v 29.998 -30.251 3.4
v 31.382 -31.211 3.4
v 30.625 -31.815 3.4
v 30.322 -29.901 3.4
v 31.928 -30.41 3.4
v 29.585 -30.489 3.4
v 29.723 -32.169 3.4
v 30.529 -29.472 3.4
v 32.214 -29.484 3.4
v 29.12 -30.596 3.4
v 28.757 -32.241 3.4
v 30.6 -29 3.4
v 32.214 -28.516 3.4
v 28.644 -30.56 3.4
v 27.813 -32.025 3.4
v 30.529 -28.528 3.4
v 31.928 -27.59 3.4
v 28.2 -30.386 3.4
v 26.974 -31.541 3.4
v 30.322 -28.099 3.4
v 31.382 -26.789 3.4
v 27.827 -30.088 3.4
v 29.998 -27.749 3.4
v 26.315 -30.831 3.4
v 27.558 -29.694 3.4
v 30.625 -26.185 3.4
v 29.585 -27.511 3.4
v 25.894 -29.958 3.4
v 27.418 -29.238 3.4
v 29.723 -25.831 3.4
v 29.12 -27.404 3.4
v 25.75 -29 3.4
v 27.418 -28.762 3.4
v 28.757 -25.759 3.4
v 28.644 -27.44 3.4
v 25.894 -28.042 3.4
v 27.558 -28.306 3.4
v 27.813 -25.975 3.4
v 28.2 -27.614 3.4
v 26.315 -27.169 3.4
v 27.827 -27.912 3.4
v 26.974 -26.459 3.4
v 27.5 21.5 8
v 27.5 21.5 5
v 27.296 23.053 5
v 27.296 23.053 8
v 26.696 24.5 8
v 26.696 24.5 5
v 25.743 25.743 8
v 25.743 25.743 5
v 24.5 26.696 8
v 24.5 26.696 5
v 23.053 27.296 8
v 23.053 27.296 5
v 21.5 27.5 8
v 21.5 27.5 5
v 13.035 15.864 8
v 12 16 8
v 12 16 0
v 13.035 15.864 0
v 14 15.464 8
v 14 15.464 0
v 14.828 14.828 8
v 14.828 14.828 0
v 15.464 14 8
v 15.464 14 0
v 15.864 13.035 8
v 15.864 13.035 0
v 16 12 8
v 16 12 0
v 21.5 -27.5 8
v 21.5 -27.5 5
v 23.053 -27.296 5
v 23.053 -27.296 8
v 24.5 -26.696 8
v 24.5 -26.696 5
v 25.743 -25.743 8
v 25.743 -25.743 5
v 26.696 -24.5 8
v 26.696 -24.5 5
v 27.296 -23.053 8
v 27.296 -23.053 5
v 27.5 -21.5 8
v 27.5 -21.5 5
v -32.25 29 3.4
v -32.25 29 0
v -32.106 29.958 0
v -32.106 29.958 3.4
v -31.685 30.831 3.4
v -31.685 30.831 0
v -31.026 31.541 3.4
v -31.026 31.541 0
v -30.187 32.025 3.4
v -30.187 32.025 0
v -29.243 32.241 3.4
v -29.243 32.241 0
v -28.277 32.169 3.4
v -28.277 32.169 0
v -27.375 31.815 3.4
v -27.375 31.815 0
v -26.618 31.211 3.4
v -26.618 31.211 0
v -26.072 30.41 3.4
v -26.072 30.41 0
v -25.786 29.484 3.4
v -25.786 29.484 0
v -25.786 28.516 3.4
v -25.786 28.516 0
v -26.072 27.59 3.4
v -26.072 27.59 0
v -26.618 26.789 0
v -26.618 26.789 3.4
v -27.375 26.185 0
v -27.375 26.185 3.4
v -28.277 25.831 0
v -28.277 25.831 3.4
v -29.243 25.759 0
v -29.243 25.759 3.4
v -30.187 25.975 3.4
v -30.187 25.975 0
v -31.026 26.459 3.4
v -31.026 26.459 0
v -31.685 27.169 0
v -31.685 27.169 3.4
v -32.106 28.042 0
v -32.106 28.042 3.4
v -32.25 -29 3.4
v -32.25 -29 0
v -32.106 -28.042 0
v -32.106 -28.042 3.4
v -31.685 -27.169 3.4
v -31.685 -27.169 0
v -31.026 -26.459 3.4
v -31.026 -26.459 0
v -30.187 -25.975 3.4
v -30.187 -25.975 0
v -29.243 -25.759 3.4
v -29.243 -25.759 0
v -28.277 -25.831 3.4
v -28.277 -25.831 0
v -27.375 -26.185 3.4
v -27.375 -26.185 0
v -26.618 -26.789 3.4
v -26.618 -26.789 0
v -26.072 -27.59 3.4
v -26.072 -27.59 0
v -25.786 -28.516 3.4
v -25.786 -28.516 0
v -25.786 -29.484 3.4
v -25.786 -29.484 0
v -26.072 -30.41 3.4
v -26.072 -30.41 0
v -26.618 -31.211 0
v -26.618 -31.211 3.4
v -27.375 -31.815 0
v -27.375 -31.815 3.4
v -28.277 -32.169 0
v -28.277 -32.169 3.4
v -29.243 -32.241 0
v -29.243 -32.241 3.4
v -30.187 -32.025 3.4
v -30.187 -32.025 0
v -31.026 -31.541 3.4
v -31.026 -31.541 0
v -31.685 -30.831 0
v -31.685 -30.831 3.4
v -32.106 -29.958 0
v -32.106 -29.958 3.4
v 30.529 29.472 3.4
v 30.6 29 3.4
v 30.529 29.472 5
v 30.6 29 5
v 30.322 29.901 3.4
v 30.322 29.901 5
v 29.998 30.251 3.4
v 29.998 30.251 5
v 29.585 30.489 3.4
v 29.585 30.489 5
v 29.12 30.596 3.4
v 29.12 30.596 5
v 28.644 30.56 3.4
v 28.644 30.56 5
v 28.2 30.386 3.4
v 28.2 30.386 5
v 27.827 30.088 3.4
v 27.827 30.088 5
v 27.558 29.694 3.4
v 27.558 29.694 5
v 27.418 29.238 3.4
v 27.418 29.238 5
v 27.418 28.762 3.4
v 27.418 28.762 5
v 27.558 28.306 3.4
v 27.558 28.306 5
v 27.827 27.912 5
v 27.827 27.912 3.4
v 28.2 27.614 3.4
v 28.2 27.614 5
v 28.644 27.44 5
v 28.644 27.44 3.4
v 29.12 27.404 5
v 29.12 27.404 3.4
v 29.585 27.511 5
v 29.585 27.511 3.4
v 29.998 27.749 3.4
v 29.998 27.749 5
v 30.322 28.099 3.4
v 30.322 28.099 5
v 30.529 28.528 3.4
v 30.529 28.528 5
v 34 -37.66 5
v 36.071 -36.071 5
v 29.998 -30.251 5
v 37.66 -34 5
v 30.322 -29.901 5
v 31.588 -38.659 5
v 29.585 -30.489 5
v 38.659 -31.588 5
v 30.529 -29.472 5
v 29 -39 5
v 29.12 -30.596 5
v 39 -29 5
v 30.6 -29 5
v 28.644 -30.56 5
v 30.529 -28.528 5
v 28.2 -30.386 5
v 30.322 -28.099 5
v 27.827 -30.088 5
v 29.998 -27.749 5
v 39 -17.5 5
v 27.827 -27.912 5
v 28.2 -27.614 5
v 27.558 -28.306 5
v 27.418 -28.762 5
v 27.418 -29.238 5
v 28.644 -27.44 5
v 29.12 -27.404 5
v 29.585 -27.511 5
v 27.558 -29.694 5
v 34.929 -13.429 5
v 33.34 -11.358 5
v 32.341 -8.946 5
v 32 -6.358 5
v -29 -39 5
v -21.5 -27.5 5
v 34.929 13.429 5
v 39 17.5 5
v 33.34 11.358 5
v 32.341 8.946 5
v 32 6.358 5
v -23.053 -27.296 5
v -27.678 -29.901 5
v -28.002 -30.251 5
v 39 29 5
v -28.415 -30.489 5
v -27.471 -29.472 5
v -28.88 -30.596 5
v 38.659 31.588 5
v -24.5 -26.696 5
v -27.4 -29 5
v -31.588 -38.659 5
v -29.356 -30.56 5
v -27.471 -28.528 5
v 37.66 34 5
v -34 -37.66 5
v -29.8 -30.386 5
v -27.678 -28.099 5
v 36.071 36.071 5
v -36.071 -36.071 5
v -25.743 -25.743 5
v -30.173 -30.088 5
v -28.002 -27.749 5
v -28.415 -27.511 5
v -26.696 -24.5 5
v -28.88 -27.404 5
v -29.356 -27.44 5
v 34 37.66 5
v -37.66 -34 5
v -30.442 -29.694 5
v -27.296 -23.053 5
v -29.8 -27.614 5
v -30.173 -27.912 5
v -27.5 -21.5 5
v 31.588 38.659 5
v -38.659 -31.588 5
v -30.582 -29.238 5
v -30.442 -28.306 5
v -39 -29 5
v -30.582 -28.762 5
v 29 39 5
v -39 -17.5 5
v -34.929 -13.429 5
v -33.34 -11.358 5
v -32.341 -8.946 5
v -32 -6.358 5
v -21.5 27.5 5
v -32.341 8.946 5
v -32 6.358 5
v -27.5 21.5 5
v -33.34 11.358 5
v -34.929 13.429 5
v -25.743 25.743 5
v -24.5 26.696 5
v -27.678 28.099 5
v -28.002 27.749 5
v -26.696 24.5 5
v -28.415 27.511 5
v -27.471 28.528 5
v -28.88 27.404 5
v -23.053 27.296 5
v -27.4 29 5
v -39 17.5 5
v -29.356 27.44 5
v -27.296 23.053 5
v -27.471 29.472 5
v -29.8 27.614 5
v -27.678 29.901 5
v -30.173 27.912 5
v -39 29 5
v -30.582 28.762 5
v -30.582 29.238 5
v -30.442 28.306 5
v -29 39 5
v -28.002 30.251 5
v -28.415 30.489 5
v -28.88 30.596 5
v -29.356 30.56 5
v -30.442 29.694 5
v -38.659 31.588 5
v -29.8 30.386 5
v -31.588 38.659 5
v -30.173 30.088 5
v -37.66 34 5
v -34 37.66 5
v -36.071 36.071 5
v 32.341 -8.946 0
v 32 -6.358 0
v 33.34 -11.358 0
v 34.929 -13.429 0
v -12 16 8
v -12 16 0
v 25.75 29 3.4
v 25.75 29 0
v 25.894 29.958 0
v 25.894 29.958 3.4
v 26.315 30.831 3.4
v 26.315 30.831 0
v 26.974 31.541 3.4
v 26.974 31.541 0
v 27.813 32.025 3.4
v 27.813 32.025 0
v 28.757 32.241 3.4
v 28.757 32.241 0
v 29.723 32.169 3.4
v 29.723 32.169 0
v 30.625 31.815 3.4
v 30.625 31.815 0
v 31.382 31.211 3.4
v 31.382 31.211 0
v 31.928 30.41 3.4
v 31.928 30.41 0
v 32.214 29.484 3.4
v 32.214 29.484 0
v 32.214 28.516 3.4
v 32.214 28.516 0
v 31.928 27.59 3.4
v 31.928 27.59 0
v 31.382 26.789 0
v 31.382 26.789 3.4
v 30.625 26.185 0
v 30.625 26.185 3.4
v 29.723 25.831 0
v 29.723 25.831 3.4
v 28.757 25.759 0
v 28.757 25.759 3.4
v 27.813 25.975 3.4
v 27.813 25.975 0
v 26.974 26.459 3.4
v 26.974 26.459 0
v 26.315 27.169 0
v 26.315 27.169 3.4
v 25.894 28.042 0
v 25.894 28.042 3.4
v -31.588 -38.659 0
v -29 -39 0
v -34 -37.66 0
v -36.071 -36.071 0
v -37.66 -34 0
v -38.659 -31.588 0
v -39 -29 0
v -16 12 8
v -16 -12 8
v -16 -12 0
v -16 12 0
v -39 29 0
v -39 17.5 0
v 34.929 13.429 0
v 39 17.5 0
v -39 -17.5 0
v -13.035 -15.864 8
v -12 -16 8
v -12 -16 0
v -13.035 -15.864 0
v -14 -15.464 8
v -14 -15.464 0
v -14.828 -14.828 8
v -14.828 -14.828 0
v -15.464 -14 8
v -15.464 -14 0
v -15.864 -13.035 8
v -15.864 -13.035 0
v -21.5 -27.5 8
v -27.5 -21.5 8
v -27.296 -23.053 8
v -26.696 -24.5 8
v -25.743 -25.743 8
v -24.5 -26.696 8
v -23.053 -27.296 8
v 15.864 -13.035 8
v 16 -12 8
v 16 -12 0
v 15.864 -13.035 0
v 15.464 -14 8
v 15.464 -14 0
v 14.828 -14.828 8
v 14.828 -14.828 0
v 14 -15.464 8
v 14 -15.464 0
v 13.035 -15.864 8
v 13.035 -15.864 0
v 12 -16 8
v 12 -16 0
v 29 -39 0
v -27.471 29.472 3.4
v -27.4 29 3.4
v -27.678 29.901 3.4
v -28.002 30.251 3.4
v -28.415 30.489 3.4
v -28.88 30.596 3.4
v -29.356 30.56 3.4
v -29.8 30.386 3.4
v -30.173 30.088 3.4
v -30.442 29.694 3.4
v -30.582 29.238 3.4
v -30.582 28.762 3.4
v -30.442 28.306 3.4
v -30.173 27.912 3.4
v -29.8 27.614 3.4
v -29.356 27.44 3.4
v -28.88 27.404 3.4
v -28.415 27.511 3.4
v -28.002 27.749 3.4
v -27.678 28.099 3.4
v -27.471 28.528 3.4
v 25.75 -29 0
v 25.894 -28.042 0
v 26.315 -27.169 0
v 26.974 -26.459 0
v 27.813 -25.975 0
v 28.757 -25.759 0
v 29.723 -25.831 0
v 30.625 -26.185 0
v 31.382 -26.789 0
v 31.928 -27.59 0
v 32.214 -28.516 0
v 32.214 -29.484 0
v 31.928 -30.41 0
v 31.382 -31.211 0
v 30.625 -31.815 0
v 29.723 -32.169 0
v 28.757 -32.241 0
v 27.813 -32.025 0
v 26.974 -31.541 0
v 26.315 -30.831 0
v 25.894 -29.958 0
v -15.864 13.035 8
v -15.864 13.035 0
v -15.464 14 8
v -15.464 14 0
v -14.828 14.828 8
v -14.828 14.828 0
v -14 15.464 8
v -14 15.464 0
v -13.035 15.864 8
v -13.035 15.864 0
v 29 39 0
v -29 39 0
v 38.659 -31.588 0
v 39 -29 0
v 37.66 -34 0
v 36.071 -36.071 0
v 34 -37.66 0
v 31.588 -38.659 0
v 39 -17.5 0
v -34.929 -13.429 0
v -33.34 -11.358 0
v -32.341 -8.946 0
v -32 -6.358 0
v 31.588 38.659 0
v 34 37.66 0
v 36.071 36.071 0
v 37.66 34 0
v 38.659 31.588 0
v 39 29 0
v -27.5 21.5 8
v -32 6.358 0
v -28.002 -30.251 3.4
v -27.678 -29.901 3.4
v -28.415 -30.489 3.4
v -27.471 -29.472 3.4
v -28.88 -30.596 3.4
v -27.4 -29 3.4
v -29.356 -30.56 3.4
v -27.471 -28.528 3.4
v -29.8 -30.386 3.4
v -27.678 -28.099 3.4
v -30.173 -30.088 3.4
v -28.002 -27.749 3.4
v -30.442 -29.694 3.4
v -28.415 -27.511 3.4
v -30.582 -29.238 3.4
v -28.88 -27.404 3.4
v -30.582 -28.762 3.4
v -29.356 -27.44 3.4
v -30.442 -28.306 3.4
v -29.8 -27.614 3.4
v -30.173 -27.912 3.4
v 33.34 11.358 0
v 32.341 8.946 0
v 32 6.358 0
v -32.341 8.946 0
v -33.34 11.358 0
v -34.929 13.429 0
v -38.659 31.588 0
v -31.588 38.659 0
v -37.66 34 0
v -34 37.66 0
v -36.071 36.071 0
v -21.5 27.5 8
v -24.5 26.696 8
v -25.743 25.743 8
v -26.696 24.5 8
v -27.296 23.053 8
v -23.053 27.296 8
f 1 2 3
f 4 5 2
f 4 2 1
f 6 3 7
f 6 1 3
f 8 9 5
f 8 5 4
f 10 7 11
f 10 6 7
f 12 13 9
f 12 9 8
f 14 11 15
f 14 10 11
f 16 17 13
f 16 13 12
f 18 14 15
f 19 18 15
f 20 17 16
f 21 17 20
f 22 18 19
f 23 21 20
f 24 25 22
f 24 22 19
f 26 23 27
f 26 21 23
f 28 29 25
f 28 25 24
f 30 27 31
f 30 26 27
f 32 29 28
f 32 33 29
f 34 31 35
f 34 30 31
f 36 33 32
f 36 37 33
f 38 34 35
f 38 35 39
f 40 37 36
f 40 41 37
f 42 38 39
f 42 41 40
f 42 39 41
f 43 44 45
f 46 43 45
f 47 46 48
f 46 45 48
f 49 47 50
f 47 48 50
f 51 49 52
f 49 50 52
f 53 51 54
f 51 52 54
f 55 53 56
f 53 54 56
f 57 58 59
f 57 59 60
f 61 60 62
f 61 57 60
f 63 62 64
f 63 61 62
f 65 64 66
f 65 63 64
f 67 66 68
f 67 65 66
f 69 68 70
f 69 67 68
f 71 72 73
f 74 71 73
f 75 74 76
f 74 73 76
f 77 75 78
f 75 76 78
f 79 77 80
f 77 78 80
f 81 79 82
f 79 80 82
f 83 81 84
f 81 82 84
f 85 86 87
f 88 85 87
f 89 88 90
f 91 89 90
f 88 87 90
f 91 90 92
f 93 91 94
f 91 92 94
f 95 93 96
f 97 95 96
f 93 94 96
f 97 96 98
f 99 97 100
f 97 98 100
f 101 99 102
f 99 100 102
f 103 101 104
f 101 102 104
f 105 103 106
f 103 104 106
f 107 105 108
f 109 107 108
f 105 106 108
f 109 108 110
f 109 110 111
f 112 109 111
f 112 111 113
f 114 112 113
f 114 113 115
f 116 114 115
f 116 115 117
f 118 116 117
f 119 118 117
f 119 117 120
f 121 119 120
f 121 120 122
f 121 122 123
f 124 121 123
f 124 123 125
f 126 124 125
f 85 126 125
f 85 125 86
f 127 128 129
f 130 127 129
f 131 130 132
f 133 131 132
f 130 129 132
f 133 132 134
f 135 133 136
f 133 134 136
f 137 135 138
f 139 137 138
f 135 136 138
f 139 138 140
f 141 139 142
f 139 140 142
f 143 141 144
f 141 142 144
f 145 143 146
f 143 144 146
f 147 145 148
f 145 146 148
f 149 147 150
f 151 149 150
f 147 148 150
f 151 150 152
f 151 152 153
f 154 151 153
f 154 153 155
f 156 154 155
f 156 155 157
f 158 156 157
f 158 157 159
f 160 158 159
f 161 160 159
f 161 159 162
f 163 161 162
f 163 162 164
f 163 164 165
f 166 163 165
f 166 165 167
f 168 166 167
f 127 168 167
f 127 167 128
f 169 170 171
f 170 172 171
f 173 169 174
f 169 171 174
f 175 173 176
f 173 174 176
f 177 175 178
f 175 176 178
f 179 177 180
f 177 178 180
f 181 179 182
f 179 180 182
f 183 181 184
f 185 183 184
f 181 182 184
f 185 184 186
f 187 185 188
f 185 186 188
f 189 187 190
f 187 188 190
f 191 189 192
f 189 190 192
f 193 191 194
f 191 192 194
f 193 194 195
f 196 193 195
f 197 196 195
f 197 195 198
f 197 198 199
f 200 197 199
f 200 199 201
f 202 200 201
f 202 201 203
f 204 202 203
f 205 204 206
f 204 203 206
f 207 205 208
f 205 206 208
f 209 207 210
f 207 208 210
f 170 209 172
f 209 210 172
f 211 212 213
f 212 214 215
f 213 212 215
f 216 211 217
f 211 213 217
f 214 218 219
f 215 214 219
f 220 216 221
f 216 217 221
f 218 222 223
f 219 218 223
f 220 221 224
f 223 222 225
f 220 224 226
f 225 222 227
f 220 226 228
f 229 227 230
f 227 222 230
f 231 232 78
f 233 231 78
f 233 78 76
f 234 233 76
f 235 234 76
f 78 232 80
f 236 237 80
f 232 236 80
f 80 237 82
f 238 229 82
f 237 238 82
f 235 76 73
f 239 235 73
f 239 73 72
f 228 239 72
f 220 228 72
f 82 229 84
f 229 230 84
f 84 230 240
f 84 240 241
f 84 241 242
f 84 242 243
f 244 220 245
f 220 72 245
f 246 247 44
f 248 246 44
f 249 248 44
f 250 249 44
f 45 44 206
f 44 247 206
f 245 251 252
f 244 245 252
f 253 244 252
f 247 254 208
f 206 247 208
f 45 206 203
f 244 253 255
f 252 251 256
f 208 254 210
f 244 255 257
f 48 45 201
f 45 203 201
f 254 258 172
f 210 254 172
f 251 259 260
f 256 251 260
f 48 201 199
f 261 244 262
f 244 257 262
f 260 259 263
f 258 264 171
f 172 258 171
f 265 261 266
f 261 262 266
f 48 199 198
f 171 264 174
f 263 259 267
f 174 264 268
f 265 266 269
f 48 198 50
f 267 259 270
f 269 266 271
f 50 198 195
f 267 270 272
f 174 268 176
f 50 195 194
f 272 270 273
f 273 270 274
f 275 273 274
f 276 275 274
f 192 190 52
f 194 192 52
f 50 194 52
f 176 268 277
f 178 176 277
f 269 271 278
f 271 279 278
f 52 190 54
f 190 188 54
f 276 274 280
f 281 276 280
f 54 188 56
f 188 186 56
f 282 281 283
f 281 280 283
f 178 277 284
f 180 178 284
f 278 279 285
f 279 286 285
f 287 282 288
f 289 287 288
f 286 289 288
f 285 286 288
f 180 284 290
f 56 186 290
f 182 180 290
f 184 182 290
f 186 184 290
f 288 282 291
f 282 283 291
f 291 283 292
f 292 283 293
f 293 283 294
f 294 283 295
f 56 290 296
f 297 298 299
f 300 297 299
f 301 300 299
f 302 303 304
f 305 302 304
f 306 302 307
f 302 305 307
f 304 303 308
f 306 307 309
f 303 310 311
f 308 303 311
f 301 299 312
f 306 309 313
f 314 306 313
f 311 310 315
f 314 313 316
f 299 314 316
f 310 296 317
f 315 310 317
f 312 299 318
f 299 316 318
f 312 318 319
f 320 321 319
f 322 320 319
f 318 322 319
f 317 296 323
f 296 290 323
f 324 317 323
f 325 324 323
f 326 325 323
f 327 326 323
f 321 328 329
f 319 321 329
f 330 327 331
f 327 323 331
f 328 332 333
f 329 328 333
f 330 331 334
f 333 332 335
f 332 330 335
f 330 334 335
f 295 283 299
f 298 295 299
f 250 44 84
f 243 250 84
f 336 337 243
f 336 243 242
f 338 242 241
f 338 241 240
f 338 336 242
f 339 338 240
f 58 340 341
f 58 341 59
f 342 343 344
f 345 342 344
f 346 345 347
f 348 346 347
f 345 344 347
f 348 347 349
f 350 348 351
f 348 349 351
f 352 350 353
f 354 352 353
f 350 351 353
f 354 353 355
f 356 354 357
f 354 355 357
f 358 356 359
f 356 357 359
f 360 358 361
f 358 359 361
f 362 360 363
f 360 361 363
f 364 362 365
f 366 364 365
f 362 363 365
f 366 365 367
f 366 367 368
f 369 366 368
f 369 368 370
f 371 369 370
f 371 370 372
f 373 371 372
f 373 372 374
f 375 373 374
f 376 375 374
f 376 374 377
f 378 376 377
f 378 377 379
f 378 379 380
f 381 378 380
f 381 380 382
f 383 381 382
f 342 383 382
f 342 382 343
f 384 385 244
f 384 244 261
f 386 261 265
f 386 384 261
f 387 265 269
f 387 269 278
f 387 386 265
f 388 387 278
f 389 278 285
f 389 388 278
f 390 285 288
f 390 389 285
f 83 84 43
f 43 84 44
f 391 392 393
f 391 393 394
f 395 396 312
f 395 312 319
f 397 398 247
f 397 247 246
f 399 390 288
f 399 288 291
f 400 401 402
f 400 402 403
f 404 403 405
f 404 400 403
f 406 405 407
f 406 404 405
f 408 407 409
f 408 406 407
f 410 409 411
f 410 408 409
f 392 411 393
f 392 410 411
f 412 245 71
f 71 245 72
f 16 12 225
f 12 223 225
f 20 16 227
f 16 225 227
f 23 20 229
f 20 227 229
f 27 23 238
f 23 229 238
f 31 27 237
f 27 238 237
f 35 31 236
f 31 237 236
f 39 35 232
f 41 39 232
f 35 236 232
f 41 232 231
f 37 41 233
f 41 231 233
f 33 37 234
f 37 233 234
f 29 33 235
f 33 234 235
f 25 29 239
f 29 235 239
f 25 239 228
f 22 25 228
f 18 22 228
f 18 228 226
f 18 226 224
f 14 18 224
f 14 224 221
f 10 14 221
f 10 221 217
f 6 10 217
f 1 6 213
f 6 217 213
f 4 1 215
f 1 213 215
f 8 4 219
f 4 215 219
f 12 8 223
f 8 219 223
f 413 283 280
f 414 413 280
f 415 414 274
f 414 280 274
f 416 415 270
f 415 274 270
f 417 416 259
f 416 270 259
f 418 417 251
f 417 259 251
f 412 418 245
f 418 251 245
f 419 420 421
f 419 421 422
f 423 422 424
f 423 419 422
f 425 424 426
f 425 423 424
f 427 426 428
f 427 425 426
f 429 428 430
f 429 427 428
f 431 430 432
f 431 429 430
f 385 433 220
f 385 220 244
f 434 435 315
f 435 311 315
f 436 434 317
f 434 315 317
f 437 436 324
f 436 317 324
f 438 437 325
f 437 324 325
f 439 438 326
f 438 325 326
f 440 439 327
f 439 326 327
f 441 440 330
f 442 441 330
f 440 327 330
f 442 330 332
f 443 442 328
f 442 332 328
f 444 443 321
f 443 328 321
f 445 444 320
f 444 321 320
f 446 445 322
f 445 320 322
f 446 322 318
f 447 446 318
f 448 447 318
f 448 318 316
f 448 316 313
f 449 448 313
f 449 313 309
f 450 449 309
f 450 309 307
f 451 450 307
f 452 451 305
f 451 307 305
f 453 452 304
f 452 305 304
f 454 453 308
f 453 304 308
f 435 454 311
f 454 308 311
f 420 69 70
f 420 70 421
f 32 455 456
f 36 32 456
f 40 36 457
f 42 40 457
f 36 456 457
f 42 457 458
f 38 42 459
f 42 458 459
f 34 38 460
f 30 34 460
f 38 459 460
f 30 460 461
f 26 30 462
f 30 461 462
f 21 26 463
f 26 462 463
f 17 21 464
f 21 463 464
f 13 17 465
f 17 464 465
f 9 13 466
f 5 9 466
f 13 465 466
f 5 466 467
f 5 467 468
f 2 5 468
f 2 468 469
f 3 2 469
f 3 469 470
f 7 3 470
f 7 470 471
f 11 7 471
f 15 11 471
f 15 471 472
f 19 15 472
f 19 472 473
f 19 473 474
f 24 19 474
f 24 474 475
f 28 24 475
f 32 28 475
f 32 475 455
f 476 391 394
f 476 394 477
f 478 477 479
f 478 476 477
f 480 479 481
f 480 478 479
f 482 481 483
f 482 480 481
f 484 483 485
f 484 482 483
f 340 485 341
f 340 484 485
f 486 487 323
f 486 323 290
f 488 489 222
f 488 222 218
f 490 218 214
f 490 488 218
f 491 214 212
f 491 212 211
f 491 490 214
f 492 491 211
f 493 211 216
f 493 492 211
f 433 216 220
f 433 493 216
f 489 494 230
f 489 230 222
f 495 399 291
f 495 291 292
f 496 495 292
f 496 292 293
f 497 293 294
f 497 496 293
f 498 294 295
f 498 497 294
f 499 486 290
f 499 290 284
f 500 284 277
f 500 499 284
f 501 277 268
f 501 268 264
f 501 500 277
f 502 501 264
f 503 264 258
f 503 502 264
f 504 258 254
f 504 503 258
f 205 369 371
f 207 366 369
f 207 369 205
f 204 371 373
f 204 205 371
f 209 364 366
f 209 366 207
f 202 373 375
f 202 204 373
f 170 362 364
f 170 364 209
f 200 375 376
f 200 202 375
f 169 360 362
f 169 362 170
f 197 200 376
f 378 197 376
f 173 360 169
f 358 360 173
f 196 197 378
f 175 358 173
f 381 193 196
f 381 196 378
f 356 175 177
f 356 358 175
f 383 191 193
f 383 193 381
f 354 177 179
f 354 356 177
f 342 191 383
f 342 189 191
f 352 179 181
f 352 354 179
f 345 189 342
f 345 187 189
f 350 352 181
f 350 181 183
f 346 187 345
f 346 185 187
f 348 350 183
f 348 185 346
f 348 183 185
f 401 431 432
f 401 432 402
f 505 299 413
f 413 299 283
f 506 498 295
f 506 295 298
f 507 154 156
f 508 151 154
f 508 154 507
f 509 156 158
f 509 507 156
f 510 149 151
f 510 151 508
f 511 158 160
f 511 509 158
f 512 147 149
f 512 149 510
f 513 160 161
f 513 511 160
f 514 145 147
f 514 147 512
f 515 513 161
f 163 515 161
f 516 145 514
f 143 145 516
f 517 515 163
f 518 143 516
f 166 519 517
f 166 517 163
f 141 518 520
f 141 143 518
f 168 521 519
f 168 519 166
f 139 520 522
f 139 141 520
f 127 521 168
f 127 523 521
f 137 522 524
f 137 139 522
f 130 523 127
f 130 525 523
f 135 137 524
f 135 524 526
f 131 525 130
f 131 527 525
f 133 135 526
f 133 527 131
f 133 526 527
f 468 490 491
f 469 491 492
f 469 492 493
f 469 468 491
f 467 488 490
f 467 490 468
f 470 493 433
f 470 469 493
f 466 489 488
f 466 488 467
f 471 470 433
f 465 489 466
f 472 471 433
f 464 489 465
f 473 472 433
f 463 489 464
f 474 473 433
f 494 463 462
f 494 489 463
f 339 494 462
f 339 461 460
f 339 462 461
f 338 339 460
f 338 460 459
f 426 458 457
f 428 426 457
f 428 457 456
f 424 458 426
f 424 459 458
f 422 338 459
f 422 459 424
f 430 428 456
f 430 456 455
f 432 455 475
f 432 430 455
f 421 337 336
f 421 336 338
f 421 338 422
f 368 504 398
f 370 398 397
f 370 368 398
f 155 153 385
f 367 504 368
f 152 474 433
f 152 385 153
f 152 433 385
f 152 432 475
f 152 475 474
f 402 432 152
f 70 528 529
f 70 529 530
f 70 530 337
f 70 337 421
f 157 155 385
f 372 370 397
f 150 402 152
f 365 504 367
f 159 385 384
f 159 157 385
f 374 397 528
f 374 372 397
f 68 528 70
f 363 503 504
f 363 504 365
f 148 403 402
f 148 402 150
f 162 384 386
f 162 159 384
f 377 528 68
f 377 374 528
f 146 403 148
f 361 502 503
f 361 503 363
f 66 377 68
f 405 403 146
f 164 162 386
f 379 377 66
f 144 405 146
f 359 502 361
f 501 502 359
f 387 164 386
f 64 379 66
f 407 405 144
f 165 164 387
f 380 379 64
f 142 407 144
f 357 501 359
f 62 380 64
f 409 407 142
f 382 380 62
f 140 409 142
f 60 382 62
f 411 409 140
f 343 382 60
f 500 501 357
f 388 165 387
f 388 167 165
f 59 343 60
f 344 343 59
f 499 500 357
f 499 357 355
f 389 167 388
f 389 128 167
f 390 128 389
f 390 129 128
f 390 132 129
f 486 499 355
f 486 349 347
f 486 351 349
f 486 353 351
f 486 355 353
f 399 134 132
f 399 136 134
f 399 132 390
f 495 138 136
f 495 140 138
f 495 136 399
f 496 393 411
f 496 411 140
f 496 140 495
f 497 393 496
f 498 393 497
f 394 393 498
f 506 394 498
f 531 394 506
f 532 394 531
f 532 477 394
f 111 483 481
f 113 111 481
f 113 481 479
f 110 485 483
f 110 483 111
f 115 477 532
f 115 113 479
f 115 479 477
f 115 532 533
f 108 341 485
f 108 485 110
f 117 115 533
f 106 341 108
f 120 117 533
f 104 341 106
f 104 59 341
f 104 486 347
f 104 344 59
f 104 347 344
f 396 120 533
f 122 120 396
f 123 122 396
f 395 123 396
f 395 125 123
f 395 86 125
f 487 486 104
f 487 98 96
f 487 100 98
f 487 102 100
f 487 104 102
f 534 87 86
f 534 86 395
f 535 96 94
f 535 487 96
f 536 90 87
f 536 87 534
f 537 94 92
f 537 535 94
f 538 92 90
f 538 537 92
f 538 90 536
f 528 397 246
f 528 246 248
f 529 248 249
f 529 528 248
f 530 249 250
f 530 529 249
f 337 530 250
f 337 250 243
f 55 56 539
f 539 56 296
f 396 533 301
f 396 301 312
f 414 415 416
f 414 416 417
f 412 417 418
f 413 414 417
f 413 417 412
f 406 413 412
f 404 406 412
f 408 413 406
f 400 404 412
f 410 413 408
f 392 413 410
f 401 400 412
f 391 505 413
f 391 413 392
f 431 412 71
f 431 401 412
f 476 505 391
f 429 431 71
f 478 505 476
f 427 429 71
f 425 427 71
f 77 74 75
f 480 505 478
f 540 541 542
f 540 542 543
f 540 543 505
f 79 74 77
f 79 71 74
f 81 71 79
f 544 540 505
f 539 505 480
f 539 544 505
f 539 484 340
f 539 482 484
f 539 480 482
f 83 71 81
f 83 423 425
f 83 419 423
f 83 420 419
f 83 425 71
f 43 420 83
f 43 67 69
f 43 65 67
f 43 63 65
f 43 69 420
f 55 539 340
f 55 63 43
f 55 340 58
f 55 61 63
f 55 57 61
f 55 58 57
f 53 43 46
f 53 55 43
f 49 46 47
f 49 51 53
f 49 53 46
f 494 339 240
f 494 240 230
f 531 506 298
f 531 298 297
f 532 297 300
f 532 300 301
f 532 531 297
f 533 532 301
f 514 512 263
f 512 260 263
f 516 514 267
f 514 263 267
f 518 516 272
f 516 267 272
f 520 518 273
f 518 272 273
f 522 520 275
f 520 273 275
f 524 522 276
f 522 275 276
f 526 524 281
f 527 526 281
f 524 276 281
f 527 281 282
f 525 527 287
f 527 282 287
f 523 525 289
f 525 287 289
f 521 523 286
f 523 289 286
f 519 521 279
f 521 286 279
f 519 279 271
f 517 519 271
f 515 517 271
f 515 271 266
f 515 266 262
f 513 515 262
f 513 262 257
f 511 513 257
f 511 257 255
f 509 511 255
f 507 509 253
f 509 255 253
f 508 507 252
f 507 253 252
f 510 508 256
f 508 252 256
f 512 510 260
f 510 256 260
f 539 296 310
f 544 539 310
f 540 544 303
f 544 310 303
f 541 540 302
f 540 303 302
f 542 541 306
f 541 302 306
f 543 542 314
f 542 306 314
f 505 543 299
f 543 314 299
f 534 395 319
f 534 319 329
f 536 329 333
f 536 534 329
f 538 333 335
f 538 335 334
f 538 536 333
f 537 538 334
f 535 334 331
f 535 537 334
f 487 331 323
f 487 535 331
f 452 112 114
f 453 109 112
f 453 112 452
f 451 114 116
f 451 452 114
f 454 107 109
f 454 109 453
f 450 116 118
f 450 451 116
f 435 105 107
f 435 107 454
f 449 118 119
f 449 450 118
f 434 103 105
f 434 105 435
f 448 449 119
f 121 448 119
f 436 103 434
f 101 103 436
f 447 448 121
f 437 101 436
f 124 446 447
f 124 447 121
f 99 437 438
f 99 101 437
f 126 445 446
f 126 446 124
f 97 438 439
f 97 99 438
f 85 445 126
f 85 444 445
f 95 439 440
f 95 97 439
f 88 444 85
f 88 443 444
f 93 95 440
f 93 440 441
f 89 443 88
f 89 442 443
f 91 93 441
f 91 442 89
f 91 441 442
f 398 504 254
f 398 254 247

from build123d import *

# Parameters (mm, degrees)
BOSS_EXTRUDE1_DEPTH                                 = 5
BOSS_EXTRUDE2_DEPTH                                 = 3
CUT_EXTRUDE1_DEPTH                                  = 56.731499172
CUT_EXTRUDE1_DEPTH_BACK                             = 56.731499172
CBORE_FOR_M3_HEX_SOCKET_HEAD_CAP_SCREW1_D           = 3.2
CBORE_FOR_M3_HEX_SOCKET_HEAD_CAP_SCREW1_CBORE_D     = 6.5
CBORE_FOR_M3_HEX_SOCKET_HEAD_CAP_SCREW1_CBORE_DEPTH = 3.4


with BuildPart() as part:
    # Sketch1 → Boss-Extrude1 (new body)
    with BuildSketch(Plane.XY):
        with BuildLine():
            Line((-29, 39), (29, 39))
            ThreePointArc((29, 39), (36.071067812, 36.071067812), (39, 29))
            Line((39, 29), (39, 17.5))
            Line((39, 17.5), (34.928932188, 13.428932188))
            ThreePointArc((34.928932188, 13.428932188), (32.761204675, 10.1846987), (32, 6.357864376))
            Line((32, 6.357864376), (32, -6.357864376))
            ThreePointArc((32, -6.357864376), (32.761204675, -10.1846987), (34.928932188, -13.428932188))
            Line((34.928932188, -13.428932188), (39, -17.5))
            Line((39, -17.5), (39, -29))
            ThreePointArc((39, -29), (36.071067812, -36.071067812), (29, -39))
            Line((29, -39), (-29, -39))
            ThreePointArc((-29, -39), (-36.071067812, -36.071067812), (-39, -29))
            Line((-39, -29), (-39, -17.5))
            Line((-39, -17.5), (-34.928932188, -13.428932188))
            ThreePointArc((-34.928932188, -13.428932188), (-32.761204675, -10.1846987), (-32, -6.357864376))
            Line((-32, -6.357864376), (-32, 6.357864376))
            ThreePointArc((-32, 6.357864376), (-32.761204675, 10.1846987), (-34.928932188, 13.428932188))
            Line((-34.928932188, 13.428932188), (-39, 17.5))
            Line((-39, 17.5), (-39, 29))
            ThreePointArc((-39, 29), (-36.071067812, 36.071067812), (-29, 39))
        make_face()
    extrude(amount=BOSS_EXTRUDE1_DEPTH)

    # Sketch2 → Boss-Extrude2 (add)
    with BuildSketch(Plane(origin=(0, 0, 5), x_dir=(-1, 0, 0), z_dir=(0, 0, -1))):
        with BuildLine():
            Line((-21.5, 27.5), (21.5, 27.5))
            ThreePointArc((21.5, 27.5), (25.742640687, 25.742640687), (27.5, 21.5))
            Line((27.5, 21.5), (27.5, -21.5))
            ThreePointArc((27.5, -21.5), (25.742640687, -25.742640687), (21.5, -27.5))
            Line((21.5, -27.5), (-21.5, -27.5))
            ThreePointArc((-21.5, -27.5), (-25.742640687, -25.742640687), (-27.5, -21.5))
            Line((-27.5, -21.5), (-27.5, 21.5))
            ThreePointArc((-27.5, 21.5), (-25.742640687, 25.742640687), (-21.5, 27.5))
        make_face()
    extrude(amount=-BOSS_EXTRUDE2_DEPTH)

    # Sketch3 → Cut-Extrude1 (cut, two sides: drawn at the far end of the back side and taken through both)
    with BuildSketch(Plane(origin=(0, 0, 0), x_dir=(-1, 0, 0), z_dir=(0, 0, -1)).offset(-CUT_EXTRUDE1_DEPTH_BACK)):
        with BuildLine():
            Line((-12, -16), (12, -16))
            ThreePointArc((12, -16), (14.828427125, -14.828427125), (16, -12))
            Line((16, -12), (16, 12))
            ThreePointArc((16, 12), (14.828427125, 14.828427125), (12, 16))
            Line((12, 16), (-12, 16))
            ThreePointArc((-12, 16), (-14.828427125, 14.828427125), (-16, 12))
            Line((-16, 12), (-16, -12))
            ThreePointArc((-16, -12), (-14.828427125, -14.828427125), (-12, -16))
        make_face()
    extrude(amount=CUT_EXTRUDE1_DEPTH + CUT_EXTRUDE1_DEPTH_BACK, mode=Mode.SUBTRACT)

    # CBORE for M3 Hex Socket Head Cap Screw1 (through all)
    with Locations(Plane(origin=(0, 0, 0), x_dir=(-1, 0, 0), z_dir=(0, 0, -1))):
        with Locations((29, -29), (29, 29), (-29, 29), (-29, -29)):
            CounterBoreHole(CBORE_FOR_M3_HEX_SOCKET_HEAD_CAP_SCREW1_D / 2, CBORE_FOR_M3_HEX_SOCKET_HEAD_CAP_SCREW1_CBORE_D / 2, CBORE_FOR_M3_HEX_SOCKET_HEAD_CAP_SCREW1_CBORE_DEPTH)


solid = part.part
